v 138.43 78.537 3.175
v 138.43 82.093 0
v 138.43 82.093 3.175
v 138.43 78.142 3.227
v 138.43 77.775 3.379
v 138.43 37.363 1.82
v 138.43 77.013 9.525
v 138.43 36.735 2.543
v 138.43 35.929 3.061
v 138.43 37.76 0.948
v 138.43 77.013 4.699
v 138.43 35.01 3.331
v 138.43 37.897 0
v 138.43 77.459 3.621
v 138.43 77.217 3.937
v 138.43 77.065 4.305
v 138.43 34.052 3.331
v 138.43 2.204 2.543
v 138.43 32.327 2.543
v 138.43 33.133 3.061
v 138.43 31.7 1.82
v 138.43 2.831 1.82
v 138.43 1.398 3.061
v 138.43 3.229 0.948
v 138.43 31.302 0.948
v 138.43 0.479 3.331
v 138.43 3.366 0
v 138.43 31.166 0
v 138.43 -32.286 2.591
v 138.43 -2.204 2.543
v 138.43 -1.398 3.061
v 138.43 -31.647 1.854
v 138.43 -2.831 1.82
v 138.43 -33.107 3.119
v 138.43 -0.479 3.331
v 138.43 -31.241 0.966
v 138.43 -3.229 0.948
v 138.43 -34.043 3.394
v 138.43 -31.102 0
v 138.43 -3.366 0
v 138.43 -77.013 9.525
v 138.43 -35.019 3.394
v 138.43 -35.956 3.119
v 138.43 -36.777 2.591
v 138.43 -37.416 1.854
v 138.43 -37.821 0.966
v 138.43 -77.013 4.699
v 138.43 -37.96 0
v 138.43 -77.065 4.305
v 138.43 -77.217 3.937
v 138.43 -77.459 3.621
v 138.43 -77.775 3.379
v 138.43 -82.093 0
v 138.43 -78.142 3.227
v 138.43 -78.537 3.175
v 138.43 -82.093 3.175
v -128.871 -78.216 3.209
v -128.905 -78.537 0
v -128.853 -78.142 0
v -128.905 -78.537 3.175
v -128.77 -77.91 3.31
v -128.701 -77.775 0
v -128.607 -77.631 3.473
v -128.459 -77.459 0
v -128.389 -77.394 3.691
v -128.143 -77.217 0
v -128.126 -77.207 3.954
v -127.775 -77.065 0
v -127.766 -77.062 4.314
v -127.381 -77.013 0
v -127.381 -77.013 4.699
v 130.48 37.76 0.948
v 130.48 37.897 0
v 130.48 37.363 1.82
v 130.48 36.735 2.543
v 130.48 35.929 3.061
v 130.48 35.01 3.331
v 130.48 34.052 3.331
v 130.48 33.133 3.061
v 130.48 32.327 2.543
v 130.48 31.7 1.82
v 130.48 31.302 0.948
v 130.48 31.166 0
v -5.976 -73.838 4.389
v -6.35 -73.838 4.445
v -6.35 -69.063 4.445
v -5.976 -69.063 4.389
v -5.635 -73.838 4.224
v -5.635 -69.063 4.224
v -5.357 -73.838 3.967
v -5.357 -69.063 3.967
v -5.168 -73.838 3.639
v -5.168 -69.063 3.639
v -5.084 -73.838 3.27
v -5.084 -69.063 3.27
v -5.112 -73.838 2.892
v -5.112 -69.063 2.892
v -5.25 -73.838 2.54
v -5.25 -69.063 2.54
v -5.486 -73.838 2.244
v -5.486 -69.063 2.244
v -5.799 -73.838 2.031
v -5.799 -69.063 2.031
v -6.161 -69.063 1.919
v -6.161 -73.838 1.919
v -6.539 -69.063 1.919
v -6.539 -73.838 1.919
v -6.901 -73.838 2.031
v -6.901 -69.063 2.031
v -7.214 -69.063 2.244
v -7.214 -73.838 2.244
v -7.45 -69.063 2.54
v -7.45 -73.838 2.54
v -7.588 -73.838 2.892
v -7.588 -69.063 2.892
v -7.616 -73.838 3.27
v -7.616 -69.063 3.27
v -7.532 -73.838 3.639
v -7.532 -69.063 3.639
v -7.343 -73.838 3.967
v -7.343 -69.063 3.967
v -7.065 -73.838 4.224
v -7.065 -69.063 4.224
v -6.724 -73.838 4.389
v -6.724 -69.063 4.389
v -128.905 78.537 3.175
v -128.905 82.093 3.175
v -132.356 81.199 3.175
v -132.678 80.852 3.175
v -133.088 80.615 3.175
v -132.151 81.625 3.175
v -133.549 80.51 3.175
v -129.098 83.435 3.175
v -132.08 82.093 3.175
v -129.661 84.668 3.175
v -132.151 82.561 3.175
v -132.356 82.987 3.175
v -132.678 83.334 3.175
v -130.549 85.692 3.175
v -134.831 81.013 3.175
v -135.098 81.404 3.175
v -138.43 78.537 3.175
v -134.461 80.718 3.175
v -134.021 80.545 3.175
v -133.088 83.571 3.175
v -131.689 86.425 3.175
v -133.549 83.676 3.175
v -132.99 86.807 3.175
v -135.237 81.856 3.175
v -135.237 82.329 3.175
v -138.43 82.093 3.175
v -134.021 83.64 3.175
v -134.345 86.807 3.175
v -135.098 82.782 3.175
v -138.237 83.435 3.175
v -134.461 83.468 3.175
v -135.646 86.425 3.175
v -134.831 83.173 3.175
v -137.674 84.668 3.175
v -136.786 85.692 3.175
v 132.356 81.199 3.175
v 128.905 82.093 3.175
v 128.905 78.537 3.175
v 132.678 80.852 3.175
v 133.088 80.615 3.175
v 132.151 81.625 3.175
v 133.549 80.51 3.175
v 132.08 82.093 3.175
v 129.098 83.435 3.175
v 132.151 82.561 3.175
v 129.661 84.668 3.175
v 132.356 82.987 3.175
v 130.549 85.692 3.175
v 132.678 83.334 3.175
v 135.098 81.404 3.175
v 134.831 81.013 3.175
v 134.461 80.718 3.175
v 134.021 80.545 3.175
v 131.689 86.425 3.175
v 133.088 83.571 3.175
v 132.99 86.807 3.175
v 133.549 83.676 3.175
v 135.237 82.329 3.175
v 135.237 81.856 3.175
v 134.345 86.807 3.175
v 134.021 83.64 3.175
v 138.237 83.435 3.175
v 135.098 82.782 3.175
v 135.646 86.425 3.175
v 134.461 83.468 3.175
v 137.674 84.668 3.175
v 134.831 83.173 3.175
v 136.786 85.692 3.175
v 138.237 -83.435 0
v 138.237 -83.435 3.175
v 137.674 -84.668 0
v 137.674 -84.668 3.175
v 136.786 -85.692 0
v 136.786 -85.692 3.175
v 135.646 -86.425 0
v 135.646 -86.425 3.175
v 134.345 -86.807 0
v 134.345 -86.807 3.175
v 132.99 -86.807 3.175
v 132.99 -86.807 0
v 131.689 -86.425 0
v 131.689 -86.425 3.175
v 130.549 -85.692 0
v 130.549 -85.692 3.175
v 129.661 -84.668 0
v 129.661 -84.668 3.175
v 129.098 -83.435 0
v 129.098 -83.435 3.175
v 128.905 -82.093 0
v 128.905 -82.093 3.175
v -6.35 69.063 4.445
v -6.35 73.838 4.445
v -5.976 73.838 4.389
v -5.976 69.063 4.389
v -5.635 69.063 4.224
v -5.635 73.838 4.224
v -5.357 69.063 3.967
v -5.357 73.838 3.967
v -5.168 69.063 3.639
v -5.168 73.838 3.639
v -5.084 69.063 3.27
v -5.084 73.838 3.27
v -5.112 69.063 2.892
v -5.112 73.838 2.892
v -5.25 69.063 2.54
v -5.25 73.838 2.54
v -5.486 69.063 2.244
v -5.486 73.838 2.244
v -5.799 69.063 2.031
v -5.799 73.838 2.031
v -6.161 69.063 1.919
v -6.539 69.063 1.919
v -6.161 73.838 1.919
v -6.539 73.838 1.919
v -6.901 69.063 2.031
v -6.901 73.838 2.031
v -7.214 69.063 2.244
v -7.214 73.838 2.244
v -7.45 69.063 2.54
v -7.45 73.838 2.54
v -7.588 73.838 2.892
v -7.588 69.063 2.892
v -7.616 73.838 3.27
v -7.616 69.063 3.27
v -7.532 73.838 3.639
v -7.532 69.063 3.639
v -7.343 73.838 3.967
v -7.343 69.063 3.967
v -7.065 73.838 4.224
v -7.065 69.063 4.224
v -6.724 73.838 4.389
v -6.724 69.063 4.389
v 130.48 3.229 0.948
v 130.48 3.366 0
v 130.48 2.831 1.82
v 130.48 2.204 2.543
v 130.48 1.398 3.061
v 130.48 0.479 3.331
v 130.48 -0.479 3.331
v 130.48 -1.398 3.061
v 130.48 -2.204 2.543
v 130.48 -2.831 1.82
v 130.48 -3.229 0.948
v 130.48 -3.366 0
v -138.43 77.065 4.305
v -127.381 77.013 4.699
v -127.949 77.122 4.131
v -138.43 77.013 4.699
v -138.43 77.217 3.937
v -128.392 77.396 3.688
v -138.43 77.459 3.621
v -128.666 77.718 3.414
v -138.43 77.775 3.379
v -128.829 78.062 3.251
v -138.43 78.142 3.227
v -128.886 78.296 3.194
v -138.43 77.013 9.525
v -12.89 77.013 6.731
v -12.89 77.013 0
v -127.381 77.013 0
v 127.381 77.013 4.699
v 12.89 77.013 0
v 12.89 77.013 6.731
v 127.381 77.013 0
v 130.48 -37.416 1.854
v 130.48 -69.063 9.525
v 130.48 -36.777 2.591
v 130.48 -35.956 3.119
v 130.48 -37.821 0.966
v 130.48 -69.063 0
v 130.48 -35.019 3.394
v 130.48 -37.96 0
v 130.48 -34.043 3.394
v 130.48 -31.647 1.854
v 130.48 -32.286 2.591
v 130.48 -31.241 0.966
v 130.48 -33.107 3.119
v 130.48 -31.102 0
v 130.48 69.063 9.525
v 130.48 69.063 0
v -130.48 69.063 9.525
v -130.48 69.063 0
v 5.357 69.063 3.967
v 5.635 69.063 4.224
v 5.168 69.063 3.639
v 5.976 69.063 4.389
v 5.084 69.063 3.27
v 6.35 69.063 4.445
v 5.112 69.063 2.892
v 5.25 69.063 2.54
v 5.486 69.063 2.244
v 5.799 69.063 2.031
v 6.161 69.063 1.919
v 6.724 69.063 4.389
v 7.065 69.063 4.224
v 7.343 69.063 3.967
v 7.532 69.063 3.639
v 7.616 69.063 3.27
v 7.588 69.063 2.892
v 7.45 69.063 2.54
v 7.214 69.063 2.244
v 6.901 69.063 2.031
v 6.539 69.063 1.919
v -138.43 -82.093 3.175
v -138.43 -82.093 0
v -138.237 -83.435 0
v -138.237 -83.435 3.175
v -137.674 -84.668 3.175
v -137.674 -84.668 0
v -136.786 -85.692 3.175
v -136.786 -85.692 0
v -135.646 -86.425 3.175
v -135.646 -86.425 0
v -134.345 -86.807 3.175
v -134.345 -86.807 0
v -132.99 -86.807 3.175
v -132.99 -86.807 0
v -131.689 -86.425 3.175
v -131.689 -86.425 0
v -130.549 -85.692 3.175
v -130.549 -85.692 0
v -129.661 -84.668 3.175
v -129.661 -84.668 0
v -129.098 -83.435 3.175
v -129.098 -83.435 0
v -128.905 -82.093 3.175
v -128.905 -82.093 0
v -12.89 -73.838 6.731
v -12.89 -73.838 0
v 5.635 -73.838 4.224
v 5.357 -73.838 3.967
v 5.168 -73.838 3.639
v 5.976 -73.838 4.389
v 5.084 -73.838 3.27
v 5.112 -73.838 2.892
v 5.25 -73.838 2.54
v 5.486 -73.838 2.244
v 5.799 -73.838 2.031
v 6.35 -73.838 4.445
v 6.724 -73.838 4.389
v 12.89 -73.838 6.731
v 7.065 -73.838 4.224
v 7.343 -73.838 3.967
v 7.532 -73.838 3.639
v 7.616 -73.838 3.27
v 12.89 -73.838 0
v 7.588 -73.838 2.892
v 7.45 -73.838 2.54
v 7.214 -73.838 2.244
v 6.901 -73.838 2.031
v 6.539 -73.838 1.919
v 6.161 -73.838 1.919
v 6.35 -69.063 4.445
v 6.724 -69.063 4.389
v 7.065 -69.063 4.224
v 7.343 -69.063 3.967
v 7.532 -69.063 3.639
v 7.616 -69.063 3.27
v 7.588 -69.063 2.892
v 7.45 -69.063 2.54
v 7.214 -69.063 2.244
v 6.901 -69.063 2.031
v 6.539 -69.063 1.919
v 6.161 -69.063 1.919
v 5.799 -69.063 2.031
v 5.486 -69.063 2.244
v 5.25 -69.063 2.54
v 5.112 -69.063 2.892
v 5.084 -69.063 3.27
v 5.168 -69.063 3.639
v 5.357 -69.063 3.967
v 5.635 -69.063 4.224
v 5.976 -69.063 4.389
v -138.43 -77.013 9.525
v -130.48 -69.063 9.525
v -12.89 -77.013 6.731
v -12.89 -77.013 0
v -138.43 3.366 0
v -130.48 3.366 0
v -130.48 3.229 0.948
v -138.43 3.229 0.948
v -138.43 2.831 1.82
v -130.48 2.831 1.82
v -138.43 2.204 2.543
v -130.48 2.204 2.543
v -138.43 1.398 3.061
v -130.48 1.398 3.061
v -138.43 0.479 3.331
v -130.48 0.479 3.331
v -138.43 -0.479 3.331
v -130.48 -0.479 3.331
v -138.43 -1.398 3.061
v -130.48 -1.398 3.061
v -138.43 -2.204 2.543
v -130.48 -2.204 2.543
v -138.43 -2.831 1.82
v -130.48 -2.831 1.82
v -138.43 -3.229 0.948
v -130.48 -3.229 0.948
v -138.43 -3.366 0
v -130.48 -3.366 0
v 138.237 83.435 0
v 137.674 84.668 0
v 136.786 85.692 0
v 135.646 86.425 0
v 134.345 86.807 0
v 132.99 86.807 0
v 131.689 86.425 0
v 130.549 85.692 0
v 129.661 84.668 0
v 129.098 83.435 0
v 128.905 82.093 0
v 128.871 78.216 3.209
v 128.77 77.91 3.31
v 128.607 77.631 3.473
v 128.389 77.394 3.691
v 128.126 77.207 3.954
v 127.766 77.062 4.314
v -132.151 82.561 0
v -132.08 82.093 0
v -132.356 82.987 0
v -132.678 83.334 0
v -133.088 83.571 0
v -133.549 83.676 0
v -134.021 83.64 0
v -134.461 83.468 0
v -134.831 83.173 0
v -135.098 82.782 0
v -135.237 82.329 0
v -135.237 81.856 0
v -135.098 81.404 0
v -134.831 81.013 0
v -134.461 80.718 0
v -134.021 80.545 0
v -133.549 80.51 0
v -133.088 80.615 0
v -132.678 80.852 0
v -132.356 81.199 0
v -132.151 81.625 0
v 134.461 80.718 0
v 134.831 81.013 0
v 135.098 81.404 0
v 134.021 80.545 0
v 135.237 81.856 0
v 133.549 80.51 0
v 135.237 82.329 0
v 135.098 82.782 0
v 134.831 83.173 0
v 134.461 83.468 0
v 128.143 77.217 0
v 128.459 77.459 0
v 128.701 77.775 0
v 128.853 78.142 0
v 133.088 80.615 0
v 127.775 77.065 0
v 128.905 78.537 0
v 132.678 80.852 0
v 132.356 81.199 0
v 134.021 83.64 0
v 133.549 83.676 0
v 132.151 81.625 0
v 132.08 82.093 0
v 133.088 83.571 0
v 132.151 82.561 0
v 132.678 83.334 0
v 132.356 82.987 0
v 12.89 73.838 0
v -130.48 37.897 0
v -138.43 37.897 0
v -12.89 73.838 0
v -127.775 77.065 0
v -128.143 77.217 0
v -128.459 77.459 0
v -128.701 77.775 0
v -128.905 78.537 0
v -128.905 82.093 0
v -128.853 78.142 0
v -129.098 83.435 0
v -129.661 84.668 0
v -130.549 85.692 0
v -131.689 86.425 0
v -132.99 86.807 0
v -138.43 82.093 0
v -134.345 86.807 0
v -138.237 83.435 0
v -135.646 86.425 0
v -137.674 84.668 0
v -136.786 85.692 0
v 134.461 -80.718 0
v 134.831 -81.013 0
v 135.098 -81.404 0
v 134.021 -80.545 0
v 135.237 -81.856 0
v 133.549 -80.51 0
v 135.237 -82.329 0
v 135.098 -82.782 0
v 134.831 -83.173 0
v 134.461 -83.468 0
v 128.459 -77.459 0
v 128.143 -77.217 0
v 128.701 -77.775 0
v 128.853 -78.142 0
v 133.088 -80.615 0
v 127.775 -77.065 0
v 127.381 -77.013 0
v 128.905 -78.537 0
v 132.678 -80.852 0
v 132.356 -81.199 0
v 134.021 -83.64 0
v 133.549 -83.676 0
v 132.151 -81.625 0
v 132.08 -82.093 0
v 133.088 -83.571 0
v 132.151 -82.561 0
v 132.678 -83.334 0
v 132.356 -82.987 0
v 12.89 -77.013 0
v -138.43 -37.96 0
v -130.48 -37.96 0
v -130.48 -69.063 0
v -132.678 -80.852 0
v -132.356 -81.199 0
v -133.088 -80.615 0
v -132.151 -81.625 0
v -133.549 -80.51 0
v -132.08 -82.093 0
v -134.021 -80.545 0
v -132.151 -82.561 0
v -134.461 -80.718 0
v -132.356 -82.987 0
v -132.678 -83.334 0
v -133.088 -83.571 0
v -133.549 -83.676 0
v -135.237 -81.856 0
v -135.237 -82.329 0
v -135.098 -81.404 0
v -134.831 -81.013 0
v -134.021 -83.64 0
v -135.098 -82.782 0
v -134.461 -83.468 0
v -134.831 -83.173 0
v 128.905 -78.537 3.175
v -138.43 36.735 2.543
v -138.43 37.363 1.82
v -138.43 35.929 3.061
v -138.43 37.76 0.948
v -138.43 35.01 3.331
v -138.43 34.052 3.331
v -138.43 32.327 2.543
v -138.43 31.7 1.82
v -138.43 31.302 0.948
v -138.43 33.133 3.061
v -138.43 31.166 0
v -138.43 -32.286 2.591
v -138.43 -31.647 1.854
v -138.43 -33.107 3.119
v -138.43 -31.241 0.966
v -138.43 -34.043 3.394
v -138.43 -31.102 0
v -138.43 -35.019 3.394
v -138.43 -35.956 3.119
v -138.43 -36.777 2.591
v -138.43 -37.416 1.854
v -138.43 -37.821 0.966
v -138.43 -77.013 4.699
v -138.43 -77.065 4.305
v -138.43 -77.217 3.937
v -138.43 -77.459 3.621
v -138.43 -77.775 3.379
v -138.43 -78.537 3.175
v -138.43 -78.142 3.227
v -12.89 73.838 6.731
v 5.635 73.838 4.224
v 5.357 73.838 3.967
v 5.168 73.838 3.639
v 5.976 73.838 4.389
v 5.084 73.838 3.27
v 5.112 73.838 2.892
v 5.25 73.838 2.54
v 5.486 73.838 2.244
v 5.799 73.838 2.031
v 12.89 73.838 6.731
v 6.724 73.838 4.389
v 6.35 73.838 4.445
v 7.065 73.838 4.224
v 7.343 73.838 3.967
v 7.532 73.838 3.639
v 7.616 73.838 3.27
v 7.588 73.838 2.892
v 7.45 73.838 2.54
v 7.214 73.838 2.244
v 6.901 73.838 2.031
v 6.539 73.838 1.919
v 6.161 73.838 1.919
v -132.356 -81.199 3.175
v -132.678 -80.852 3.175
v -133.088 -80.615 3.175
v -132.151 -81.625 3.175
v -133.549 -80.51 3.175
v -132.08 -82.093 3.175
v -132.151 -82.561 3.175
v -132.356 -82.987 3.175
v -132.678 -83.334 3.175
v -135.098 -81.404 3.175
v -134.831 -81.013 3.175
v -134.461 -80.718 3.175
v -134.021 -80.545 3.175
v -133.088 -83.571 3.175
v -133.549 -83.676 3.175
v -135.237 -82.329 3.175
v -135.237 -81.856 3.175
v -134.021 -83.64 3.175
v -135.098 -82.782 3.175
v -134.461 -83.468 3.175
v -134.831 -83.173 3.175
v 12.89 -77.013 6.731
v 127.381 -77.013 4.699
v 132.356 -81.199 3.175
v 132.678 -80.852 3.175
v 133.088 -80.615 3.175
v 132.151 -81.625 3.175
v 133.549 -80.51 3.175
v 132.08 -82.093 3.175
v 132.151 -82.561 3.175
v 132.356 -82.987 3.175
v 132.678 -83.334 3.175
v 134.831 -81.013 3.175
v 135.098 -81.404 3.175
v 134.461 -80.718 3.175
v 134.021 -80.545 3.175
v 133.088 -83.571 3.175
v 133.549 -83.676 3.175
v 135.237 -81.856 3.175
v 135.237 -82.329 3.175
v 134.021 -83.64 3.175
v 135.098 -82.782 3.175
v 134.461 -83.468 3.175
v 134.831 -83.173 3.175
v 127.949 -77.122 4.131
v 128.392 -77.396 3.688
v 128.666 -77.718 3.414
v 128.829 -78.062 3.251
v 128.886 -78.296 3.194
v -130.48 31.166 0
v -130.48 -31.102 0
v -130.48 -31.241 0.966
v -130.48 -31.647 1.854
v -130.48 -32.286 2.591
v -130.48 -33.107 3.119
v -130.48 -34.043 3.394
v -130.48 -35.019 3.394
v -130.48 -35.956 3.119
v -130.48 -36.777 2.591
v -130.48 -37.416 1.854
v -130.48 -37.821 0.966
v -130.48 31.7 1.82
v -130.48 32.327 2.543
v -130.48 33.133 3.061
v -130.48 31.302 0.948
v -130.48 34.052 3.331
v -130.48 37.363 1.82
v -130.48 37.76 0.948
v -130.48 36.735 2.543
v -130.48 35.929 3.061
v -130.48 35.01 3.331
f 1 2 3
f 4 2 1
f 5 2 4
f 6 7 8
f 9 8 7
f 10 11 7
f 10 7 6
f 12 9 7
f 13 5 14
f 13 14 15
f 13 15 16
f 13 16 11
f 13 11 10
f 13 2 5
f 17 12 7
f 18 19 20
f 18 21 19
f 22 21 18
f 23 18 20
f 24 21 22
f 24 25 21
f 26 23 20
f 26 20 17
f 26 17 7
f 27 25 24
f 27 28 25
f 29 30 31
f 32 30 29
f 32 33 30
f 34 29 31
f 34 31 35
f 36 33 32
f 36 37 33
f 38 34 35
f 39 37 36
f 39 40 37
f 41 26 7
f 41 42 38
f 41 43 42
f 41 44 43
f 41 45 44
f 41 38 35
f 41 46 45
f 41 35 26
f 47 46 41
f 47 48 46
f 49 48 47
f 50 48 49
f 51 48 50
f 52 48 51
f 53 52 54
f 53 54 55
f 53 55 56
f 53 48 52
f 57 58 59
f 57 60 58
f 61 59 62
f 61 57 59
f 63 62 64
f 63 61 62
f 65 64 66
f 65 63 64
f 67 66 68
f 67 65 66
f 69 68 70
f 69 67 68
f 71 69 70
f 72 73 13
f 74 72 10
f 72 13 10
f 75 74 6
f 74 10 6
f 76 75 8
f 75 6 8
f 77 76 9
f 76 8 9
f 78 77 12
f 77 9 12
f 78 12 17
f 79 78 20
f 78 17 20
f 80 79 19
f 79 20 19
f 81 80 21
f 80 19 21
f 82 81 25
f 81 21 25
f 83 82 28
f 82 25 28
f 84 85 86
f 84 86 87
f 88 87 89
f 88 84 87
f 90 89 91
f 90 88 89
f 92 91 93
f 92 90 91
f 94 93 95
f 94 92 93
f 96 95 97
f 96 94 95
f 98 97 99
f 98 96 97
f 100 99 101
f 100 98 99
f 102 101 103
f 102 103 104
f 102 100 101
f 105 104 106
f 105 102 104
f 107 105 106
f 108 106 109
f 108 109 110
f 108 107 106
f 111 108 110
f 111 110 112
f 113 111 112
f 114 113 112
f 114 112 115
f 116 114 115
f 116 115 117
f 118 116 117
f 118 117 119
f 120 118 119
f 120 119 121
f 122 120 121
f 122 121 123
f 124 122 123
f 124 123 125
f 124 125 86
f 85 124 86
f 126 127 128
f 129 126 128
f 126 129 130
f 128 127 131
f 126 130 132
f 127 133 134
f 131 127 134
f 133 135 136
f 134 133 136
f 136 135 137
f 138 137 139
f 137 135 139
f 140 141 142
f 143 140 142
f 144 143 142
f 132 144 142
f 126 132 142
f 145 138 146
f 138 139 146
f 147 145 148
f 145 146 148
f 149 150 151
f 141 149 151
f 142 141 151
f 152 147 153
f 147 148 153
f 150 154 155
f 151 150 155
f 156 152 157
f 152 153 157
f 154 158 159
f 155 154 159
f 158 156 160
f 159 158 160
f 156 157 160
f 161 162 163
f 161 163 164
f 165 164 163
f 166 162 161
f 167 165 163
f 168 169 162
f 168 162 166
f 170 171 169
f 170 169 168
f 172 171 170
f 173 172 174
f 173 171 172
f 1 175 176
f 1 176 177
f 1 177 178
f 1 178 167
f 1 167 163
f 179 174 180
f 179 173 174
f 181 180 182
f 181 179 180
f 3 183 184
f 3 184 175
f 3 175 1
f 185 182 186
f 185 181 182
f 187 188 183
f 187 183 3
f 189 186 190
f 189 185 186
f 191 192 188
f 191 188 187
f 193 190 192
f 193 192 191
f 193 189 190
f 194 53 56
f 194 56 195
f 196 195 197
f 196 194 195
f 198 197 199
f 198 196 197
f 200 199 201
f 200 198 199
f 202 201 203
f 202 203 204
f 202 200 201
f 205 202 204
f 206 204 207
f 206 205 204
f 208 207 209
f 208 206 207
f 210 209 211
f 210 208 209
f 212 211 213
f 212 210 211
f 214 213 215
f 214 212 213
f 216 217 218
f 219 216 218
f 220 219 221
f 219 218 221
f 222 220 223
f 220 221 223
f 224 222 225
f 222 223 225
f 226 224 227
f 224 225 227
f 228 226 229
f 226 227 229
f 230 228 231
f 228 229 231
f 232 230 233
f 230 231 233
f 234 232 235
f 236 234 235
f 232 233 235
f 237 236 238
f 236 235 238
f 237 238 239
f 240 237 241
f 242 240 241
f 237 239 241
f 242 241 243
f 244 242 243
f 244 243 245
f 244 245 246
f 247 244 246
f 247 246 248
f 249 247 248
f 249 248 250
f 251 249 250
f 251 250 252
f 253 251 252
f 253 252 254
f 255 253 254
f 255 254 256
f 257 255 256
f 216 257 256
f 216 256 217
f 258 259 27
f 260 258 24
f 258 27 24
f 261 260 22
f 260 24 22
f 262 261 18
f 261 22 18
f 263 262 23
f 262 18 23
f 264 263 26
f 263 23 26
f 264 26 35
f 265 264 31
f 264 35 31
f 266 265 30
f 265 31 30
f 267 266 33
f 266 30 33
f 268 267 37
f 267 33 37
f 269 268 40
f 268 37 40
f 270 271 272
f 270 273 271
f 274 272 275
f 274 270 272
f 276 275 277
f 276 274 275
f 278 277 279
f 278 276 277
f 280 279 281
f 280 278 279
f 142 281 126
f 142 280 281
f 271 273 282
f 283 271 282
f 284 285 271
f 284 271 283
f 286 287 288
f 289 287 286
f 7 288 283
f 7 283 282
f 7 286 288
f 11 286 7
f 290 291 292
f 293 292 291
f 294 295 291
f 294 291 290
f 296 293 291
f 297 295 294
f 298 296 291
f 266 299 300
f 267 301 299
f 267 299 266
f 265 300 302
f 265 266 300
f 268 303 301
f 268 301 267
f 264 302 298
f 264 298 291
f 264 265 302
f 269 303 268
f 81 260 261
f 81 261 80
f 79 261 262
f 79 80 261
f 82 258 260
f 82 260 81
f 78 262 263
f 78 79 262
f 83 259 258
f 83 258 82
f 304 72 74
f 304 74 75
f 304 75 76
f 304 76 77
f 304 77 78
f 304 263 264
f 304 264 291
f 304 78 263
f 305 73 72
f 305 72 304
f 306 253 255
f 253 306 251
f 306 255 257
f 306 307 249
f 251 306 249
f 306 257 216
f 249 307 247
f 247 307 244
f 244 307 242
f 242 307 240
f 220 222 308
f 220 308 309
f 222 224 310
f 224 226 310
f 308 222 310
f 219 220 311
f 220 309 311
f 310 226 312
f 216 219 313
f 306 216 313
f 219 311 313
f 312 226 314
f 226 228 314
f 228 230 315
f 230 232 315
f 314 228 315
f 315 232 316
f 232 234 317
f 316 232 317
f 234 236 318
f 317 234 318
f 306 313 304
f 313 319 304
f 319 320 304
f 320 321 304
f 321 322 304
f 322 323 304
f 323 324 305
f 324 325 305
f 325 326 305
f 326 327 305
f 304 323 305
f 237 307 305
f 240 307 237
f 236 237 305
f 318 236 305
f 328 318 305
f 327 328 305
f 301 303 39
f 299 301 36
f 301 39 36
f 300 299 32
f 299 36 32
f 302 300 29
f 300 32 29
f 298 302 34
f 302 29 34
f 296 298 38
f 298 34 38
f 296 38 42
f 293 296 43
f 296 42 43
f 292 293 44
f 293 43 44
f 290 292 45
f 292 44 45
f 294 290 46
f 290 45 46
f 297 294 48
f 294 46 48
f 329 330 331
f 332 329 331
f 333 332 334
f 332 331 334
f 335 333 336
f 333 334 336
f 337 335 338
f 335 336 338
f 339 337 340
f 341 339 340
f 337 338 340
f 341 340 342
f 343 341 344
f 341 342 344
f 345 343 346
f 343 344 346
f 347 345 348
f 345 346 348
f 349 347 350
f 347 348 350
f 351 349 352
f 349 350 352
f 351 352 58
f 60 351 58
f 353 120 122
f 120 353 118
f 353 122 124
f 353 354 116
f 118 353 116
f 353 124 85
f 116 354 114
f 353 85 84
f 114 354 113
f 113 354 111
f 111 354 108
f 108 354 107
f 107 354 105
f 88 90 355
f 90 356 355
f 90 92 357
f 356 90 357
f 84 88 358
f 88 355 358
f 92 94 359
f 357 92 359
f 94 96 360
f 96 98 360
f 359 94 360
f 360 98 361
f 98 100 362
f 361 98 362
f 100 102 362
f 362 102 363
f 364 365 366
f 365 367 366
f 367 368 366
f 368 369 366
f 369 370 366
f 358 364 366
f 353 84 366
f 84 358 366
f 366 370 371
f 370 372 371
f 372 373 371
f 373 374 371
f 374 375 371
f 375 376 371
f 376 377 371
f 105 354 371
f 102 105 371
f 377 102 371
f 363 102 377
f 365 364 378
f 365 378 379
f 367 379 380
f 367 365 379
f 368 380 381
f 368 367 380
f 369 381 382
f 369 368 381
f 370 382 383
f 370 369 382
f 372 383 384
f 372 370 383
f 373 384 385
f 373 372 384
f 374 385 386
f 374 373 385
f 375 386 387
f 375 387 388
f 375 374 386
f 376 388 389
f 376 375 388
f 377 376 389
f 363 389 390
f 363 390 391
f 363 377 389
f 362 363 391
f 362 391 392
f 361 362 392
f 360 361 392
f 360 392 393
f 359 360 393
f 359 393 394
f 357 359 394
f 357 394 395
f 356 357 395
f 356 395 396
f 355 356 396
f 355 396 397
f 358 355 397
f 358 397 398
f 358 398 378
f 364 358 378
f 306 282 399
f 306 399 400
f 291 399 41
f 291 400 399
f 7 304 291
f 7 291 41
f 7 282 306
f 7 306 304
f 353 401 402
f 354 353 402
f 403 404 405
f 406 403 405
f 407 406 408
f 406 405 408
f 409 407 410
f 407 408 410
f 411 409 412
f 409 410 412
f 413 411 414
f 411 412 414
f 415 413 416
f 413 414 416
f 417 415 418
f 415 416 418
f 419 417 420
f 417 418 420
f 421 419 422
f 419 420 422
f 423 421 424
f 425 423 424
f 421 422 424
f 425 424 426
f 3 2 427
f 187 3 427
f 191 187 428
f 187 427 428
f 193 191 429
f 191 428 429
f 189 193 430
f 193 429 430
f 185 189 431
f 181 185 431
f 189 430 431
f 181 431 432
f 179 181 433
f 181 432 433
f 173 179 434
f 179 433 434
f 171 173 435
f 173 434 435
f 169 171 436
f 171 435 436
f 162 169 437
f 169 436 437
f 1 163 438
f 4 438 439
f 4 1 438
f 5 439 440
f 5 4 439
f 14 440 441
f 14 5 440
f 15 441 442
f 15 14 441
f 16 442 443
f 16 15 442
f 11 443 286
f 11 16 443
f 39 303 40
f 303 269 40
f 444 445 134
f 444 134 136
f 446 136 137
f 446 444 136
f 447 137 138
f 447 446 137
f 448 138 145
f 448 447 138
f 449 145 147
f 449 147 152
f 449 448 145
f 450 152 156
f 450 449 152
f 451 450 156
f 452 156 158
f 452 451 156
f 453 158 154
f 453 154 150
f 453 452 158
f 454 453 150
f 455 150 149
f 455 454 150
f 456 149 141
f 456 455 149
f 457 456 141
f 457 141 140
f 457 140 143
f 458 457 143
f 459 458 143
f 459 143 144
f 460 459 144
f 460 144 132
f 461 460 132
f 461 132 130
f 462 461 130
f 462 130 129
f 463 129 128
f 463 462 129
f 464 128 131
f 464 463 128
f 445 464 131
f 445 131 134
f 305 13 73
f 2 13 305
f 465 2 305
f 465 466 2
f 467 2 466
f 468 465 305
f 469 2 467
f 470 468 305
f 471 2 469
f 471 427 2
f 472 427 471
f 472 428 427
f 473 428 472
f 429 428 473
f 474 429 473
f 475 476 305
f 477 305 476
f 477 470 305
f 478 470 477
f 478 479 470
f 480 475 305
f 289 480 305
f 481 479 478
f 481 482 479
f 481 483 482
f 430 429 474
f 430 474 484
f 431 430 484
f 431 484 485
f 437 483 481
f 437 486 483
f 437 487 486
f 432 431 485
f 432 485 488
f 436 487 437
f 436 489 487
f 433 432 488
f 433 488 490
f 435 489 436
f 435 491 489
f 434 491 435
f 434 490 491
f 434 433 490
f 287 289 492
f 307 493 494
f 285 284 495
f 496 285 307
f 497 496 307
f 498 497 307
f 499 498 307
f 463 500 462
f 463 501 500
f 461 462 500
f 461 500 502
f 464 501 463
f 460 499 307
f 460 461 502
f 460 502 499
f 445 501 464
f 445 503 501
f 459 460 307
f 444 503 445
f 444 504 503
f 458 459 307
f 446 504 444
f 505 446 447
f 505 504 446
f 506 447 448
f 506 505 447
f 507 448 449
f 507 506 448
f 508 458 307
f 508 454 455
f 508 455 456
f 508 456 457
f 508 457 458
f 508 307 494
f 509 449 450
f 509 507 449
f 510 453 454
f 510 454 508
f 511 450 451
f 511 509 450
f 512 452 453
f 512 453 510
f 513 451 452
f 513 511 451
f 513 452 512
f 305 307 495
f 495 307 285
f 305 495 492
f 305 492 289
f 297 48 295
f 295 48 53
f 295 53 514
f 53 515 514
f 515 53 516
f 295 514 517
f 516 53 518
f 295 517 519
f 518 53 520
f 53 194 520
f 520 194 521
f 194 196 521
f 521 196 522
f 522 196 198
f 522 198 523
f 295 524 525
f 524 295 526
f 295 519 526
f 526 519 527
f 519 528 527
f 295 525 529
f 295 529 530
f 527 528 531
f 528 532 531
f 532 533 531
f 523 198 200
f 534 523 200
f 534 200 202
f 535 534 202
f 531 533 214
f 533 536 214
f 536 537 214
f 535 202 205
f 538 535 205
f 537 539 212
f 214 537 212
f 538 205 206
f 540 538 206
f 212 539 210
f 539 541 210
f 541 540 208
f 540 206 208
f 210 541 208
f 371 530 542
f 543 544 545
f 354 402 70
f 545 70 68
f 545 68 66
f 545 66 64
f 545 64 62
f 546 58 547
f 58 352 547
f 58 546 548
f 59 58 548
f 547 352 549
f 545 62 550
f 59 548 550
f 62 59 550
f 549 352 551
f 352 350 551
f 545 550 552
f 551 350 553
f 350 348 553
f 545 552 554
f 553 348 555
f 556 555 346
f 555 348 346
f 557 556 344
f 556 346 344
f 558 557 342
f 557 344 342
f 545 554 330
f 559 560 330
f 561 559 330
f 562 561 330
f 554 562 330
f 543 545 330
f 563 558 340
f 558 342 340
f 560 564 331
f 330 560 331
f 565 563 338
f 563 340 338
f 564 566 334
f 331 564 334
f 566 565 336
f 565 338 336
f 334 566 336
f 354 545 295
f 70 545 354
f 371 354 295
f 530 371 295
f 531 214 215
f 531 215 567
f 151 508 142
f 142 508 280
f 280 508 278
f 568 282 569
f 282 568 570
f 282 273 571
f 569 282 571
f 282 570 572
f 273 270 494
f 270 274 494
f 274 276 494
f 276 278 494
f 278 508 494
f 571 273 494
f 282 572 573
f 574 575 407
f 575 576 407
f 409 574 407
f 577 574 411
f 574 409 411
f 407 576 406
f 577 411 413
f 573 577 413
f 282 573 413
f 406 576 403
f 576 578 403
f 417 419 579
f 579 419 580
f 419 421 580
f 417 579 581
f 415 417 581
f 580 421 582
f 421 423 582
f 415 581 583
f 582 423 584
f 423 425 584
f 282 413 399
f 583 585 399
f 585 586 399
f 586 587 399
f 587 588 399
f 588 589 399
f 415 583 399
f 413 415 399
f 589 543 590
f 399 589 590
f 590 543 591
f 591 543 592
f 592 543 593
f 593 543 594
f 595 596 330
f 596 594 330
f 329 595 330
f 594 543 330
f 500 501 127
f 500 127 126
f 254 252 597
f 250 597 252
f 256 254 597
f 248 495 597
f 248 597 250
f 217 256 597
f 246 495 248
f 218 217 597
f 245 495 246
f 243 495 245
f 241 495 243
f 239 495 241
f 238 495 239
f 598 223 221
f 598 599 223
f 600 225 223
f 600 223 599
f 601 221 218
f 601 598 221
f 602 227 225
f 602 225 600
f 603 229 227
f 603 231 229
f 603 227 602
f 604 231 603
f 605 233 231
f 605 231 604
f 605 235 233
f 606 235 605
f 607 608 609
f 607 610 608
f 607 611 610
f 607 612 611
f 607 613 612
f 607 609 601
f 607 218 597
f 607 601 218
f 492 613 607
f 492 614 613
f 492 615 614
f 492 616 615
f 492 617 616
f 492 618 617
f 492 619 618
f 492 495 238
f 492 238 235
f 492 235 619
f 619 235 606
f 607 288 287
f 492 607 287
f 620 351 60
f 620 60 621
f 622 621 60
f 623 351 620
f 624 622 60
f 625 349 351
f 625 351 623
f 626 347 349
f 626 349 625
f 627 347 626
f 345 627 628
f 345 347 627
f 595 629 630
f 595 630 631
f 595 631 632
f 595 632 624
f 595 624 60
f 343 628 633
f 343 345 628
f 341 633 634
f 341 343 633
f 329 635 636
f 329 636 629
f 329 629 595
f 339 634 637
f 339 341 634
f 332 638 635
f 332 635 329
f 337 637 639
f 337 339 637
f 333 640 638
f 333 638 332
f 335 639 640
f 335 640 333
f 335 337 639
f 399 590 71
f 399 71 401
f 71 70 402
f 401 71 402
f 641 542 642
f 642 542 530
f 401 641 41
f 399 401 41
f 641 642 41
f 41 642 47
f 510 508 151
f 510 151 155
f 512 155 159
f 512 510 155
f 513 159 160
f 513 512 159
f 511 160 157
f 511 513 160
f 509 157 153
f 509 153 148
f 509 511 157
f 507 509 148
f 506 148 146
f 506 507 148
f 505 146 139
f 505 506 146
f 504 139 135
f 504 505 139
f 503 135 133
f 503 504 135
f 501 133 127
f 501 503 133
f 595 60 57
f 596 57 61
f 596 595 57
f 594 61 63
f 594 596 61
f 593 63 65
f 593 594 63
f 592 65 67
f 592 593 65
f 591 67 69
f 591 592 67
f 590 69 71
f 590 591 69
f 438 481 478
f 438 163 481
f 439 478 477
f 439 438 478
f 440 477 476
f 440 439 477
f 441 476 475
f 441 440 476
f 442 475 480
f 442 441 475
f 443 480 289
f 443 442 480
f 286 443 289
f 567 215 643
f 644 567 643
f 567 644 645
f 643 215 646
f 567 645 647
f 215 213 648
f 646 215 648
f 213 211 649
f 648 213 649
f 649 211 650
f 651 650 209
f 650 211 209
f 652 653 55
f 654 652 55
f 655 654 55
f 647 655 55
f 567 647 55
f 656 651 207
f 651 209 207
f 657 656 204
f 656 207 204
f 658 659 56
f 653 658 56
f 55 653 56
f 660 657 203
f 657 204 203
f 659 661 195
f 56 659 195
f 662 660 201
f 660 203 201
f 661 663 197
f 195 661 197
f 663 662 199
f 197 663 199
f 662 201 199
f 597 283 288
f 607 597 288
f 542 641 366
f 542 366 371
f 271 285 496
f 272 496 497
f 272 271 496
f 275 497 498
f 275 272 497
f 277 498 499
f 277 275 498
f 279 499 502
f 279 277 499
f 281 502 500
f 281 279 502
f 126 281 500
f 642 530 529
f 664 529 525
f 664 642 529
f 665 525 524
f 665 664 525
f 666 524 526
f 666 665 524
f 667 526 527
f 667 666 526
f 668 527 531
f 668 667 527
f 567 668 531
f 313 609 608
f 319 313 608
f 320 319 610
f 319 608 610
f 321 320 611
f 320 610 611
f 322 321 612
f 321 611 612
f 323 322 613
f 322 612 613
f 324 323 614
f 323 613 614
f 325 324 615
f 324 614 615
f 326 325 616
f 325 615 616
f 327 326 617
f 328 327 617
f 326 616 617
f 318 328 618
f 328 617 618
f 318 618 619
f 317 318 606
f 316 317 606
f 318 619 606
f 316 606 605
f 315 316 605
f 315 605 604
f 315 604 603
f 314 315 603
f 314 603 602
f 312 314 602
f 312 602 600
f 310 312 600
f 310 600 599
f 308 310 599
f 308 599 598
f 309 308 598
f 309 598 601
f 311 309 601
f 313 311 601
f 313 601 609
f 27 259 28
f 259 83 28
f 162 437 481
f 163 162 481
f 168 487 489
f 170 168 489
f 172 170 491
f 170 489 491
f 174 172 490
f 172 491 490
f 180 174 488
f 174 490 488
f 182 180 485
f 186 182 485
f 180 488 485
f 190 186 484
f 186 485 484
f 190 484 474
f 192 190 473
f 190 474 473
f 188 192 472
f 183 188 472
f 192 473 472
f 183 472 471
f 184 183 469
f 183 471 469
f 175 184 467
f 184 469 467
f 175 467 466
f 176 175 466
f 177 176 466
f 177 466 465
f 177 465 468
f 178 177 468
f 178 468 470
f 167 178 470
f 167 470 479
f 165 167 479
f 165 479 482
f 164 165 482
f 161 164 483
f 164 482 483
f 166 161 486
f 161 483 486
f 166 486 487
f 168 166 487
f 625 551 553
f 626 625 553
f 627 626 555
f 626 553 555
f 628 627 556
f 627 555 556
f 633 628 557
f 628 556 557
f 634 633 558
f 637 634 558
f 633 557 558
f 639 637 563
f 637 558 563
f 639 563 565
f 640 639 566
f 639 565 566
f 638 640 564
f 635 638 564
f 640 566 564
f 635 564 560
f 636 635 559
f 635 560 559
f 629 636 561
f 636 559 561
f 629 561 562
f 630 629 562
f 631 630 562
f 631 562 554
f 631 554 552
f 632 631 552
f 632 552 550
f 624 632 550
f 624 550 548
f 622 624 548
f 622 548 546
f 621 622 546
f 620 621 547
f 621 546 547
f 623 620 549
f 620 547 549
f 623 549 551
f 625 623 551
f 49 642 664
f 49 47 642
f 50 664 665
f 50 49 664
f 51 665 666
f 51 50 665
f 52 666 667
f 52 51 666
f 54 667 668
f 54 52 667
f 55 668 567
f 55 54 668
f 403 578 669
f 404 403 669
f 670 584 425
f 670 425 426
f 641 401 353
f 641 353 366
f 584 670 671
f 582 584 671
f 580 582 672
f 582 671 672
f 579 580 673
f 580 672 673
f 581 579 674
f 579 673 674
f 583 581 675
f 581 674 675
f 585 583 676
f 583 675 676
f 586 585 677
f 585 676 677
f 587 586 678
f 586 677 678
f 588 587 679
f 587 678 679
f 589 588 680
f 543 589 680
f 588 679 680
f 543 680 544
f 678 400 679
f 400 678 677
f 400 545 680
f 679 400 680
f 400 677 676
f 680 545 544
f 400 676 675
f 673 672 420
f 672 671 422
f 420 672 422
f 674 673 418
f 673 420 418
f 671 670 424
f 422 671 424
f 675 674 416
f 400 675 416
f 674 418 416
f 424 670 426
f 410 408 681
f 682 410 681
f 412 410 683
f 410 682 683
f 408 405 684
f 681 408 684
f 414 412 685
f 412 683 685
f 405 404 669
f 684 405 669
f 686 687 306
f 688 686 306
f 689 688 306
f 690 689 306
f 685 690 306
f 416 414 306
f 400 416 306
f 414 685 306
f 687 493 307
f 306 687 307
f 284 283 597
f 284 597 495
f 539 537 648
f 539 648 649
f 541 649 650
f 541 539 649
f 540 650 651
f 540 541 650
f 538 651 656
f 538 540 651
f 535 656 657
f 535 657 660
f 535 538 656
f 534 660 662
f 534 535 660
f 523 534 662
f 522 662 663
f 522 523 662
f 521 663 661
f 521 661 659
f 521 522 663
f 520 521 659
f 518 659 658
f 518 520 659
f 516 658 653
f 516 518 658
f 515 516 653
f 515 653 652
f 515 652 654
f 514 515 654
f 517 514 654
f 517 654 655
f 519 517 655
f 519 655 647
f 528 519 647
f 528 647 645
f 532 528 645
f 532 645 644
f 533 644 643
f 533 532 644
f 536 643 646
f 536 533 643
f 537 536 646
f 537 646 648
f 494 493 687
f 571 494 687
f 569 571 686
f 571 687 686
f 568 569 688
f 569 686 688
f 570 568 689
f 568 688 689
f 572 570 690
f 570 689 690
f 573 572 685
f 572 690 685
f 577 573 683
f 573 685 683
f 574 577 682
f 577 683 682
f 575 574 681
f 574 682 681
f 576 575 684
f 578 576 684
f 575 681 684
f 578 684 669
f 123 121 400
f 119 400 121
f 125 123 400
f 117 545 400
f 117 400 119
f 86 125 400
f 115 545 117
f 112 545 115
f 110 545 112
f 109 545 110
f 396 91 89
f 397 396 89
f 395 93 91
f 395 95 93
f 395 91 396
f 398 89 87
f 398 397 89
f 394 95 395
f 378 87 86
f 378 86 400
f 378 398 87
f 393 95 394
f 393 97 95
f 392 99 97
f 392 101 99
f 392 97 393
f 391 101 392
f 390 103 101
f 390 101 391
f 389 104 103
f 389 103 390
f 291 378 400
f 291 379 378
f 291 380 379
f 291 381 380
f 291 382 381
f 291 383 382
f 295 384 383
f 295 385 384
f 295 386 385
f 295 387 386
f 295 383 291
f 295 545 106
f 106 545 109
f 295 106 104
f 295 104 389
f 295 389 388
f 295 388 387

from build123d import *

# Parameters (mm, degrees)
SKETCH1_W               = 276.86
SKETCH1_H               = 154.0256
SKETCH1_W_2             = 260.9596
SKETCH1_H_2             = 138.1252
BOSS_EXTRUDE1_DEPTH     = 9.525
SKETCH2_R               = 3.3655
SKETCH2_R_2             = 3.429
CUT_EXTRUDE1_DEPTH      = 288.52940126
SKETCH3_R               = 1.5875
BOSS_EXTRUDE2_DEPTH     = 3.175
MIRROR2_COPY_1_SKETCH_R = 1.5875
MIRROR2_COPY_1_DEPTH    = 3.175
FILLET1_R               = 1.524
SKETCH4_W               = 25.781
SKETCH4_H               = 13.462
CUT_EXTRUDE2_DEPTH      = 3.175
CUT_EXTRUDE3_REACH      = 214.311
SKETCH5_R               = 1.27


with BuildPart() as part:
    # Sketch1 → Boss-Extrude1 (new body)
    with BuildSketch(Plane.XY):
        Rectangle(SKETCH1_W, SKETCH1_H)
        Rectangle(SKETCH1_W_2, SKETCH1_H_2, mode=Mode.SUBTRACT)
    extrude(amount=BOSS_EXTRUDE1_DEPTH)

    # Sketch2 → Cut-Extrude1 (cut, through all)
    with BuildSketch(Plane(origin=(138.43, 0, 0), x_dir=(0, 0, -1), z_dir=(1, 0, 0))):
        Circle(SKETCH2_R)
        with Locations((0, 34.5313)):
            Circle(SKETCH2_R)
        with Locations((0, -34.5313)):
            Circle(SKETCH2_R_2)
    extrude(amount=-CUT_EXTRUDE1_DEPTH, mode=Mode.SUBTRACT)

    # Sketch3 → Boss-Extrude2 (add)
    with BuildSketch(Plane(origin=(0, 0, 0), x_dir=(-1, 0, 0), z_dir=(0, 0, -1))):
        with BuildLine():
            Line((-138.43, 77.0128), (-138.43, 82.0928))
            ThreePointArc((-138.43, 82.0928), (-133.6675, 86.8553), (-128.905, 82.0928))
            Line((-128.905, 82.0928), (-128.905, 77.0128))
            Line((-128.905, 77.0128), (-138.43, 77.0128))
        make_face()
        with Locations((-133.6675, 82.0928)):
            Circle(SKETCH3_R, mode=Mode.SUBTRACT)
    boss_extrude2 = extrude(amount=-BOSS_EXTRUDE2_DEPTH)

    # Mirror1: Boss-Extrude2 across plane
    add(boss_extrude2.mirror(Plane(origin=(0, 0, 0), x_dir=(0, 0, 1), z_dir=(1, 0, 0))))

    # Mirror2: Boss-Extrude2 across plane
    add(boss_extrude2.mirror(Plane.ZX))

    # Mirror2 copy 1 sketch → Mirror2 copy 1 (add)
    with BuildSketch(Plane(origin=(0, 0, 0), x_dir=(1, 0, 0), z_dir=(0, 0, -1))):
        with BuildLine():
            Line((-138.43, 77.0128), (-138.43, 82.0928))
            ThreePointArc((-138.43, 82.0928), (-133.6675, 86.8553), (-128.905, 82.0928))
            Line((-128.905, 82.0928), (-128.905, 77.0128))
            Line((-128.905, 77.0128), (-138.43, 77.0128))
        make_face()
        with Locations((-133.6675, 82.0928)):
            Circle(MIRROR2_COPY_1_SKETCH_R, mode=Mode.SUBTRACT)
    extrude(amount=-MIRROR2_COPY_1_DEPTH)

    # Fillet1
    fillet1_edges = [part.edges().sort_by_distance(p)[0] for p in [
        (133.6675, -77.0128, 3.175),
        (128.905, -77.0128, 1.5875),
        (-133.6675, -77.0128, 3.175),
        (-128.905, -77.0128, 1.5875),
        (133.6675, 77.0128, 3.175),
        (128.905, 77.0128, 1.5875),
        (-133.6675, 77.0128, 3.175),
        (-128.905, 77.0128, 1.5875),
    ]]
    fillet(fillet1_edges, radius=FILLET1_R)

    # Sketch4 → Cut-Extrude2 (cut)
    with BuildSketch(Plane(origin=(0, 77.0128, 0), x_dir=(1, 0, 0), z_dir=(0, 1, 0))):
        Rectangle(SKETCH4_W, SKETCH4_H)
    cut_extrude2 = extrude(amount=-CUT_EXTRUDE2_DEPTH, mode=Mode.SUBTRACT)

    # Sketch5 → Cut-Extrude3 (cut, up to next)
    with BuildSketch(Plane(origin=(0, 73.8378, 0), x_dir=(1, 0, 0), z_dir=(0, 1, 0)), mode=Mode.PRIVATE) as cut_extrude3_sk1:
        with Locations(Location((6.35, -3.175, 0), (0, 0, 270))):
            Circle(SKETCH5_R)
    cut_extrude3_tool1 = extrude(cut_extrude3_sk1.sketch, amount=-CUT_EXTRUDE3_REACH, mode=Mode.PRIVATE) & part.part
    # Sketch5 → Cut-Extrude3 (cut, up to next)
    with BuildSketch(Plane(origin=(0, 73.8378, 0), x_dir=(1, 0, 0), z_dir=(0, 1, 0)), mode=Mode.PRIVATE) as cut_extrude3_sk2:
        with Locations(Location((-6.35, -3.175, 0), (0, 0, 270))):
            Circle(SKETCH5_R)
    cut_extrude3_tool2 = extrude(cut_extrude3_sk2.sketch, amount=-CUT_EXTRUDE3_REACH, mode=Mode.PRIVATE) & part.part
    cut_extrude3_1 = cut_extrude3_tool1.solids().sort_by_distance((6.35, 73.8378, 3.175))[0]
    add(cut_extrude3_1, mode=Mode.SUBTRACT)
    cut_extrude3_2 = cut_extrude3_tool2.solids().sort_by_distance((-6.35, 73.8378, 3.175))[0]
    add(cut_extrude3_2, mode=Mode.SUBTRACT)
    cut_extrude3 = cut_extrude3_1 + cut_extrude3_2  # Cut-Extrude3 as one shape, for the pattern or mirror that repeats it

    # Mirror3: Cut-Extrude2, Cut-Extrude3 across plane
    add(cut_extrude2.mirror(Plane.ZX), mode=Mode.SUBTRACT)
    add(cut_extrude3.mirror(Plane.ZX), mode=Mode.SUBTRACT)


solid = part.part
